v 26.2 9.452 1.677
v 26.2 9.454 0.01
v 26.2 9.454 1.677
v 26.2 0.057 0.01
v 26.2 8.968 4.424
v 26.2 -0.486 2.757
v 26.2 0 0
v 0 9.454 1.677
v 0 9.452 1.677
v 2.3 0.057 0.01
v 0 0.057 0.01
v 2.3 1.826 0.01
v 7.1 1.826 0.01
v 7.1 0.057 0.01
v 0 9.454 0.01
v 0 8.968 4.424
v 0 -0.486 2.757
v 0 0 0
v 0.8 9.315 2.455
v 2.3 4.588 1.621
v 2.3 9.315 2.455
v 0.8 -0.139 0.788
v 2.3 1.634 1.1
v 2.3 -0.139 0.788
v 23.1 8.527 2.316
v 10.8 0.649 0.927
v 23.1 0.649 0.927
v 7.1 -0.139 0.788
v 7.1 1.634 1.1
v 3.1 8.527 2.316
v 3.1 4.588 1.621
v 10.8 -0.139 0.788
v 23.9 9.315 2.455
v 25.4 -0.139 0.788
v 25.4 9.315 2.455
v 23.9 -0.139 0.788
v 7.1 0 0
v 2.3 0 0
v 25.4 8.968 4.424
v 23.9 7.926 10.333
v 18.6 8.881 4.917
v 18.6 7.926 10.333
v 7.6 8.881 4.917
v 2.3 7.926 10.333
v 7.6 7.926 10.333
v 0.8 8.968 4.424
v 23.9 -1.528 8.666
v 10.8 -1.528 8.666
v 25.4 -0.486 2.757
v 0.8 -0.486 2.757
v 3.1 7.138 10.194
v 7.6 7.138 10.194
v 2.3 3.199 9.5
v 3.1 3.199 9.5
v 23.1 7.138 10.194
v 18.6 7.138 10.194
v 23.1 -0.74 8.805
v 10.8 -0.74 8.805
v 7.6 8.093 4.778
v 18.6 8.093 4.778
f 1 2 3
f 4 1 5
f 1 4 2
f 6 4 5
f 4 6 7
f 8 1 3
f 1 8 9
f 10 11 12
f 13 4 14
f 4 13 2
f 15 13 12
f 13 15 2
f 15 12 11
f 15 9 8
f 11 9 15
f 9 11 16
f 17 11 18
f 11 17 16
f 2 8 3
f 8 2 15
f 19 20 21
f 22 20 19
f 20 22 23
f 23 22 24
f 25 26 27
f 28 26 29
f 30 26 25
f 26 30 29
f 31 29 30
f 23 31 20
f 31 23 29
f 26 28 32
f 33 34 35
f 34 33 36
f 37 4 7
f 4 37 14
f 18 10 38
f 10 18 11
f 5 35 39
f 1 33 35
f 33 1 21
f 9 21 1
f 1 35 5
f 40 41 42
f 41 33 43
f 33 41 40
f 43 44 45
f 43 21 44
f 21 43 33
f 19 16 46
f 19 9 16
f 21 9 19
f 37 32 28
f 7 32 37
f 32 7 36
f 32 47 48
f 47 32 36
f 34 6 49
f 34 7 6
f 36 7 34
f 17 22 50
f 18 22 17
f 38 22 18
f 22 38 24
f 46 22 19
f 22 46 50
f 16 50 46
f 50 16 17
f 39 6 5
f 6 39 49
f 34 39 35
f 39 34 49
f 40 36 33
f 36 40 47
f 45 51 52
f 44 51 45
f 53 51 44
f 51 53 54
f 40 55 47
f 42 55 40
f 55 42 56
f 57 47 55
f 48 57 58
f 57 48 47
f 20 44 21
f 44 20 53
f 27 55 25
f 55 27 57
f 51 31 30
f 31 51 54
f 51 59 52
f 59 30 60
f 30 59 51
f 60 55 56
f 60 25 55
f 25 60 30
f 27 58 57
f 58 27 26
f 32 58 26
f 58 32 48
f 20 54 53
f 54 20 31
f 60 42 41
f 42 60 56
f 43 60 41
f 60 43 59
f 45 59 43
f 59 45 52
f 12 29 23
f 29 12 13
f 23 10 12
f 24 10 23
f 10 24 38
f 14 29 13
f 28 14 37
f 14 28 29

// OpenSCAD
/* [Angle] */
// Angle in degrees
angle = 10; // [0:1:89]

/* [Measurements] */
// Wall thickness
walls = 0.8;
width = 8;
length = 20;
height = 8;

hookSpacing = 1.5;
hookHeight = 2;

displayCutoutLength = 8.5;

camDiameter = 11;
camZOffset = 2.5;

/* [Hidden] */
outerLength = length + walls * 2;
outerWidth = width + walls * 2;
outerHeight = height + walls;

hookLength = outerLength + walls * 2 + hookSpacing * 2;

difference() {
    angled();
    
    rotate([angle, 0, 0])
        translate([hookSpacing + walls, -1, -1])
            cube([walls+4, walls + 2, walls + 2]);
}


module angled() {
    translate([0, 0, 0.01])
        wedge();
    rotate([angle, 0, 0])
        bracket();
}

module wedge() {
    a = outerWidth * cos(90 - angle);
    b = sqrt(outerWidth * outerWidth - a * a);

    difference() {
        cube([hookLength, b,  a]);
        rotate([angle, 0, 0])
            cube([hookLength, b,  a]);
    }
    
}

module bracket() {
    hook();
    rotate([0,0,0])
    translate([walls + hookSpacing, 0, 0])
        camMount();
}

module hook() {
    cube([hookLength, outerWidth, walls]);
    cube([walls, outerWidth, hookHeight + walls]);
    translate([hookLength - walls, 0, 0])
        cube([walls, outerWidth, hookHeight + walls]);
}

module camMount() {
    difference() {
        cube([outerLength, outerWidth, outerHeight]);
        
        translate([walls, walls, walls])
            cube([length, width, height + 1]);
        
        // Display cutout
        translate([-1, -1, walls])
            cube([displayCutoutLength + 1, outerWidth/2 + 1, height + 1]);
        
        // Cam cutout
        translate([length / 2 + walls - camDiameter / 2, width, camZOffset + walls])
            cube([camDiameter, walls + 2, outerHeight]);
    }
}
